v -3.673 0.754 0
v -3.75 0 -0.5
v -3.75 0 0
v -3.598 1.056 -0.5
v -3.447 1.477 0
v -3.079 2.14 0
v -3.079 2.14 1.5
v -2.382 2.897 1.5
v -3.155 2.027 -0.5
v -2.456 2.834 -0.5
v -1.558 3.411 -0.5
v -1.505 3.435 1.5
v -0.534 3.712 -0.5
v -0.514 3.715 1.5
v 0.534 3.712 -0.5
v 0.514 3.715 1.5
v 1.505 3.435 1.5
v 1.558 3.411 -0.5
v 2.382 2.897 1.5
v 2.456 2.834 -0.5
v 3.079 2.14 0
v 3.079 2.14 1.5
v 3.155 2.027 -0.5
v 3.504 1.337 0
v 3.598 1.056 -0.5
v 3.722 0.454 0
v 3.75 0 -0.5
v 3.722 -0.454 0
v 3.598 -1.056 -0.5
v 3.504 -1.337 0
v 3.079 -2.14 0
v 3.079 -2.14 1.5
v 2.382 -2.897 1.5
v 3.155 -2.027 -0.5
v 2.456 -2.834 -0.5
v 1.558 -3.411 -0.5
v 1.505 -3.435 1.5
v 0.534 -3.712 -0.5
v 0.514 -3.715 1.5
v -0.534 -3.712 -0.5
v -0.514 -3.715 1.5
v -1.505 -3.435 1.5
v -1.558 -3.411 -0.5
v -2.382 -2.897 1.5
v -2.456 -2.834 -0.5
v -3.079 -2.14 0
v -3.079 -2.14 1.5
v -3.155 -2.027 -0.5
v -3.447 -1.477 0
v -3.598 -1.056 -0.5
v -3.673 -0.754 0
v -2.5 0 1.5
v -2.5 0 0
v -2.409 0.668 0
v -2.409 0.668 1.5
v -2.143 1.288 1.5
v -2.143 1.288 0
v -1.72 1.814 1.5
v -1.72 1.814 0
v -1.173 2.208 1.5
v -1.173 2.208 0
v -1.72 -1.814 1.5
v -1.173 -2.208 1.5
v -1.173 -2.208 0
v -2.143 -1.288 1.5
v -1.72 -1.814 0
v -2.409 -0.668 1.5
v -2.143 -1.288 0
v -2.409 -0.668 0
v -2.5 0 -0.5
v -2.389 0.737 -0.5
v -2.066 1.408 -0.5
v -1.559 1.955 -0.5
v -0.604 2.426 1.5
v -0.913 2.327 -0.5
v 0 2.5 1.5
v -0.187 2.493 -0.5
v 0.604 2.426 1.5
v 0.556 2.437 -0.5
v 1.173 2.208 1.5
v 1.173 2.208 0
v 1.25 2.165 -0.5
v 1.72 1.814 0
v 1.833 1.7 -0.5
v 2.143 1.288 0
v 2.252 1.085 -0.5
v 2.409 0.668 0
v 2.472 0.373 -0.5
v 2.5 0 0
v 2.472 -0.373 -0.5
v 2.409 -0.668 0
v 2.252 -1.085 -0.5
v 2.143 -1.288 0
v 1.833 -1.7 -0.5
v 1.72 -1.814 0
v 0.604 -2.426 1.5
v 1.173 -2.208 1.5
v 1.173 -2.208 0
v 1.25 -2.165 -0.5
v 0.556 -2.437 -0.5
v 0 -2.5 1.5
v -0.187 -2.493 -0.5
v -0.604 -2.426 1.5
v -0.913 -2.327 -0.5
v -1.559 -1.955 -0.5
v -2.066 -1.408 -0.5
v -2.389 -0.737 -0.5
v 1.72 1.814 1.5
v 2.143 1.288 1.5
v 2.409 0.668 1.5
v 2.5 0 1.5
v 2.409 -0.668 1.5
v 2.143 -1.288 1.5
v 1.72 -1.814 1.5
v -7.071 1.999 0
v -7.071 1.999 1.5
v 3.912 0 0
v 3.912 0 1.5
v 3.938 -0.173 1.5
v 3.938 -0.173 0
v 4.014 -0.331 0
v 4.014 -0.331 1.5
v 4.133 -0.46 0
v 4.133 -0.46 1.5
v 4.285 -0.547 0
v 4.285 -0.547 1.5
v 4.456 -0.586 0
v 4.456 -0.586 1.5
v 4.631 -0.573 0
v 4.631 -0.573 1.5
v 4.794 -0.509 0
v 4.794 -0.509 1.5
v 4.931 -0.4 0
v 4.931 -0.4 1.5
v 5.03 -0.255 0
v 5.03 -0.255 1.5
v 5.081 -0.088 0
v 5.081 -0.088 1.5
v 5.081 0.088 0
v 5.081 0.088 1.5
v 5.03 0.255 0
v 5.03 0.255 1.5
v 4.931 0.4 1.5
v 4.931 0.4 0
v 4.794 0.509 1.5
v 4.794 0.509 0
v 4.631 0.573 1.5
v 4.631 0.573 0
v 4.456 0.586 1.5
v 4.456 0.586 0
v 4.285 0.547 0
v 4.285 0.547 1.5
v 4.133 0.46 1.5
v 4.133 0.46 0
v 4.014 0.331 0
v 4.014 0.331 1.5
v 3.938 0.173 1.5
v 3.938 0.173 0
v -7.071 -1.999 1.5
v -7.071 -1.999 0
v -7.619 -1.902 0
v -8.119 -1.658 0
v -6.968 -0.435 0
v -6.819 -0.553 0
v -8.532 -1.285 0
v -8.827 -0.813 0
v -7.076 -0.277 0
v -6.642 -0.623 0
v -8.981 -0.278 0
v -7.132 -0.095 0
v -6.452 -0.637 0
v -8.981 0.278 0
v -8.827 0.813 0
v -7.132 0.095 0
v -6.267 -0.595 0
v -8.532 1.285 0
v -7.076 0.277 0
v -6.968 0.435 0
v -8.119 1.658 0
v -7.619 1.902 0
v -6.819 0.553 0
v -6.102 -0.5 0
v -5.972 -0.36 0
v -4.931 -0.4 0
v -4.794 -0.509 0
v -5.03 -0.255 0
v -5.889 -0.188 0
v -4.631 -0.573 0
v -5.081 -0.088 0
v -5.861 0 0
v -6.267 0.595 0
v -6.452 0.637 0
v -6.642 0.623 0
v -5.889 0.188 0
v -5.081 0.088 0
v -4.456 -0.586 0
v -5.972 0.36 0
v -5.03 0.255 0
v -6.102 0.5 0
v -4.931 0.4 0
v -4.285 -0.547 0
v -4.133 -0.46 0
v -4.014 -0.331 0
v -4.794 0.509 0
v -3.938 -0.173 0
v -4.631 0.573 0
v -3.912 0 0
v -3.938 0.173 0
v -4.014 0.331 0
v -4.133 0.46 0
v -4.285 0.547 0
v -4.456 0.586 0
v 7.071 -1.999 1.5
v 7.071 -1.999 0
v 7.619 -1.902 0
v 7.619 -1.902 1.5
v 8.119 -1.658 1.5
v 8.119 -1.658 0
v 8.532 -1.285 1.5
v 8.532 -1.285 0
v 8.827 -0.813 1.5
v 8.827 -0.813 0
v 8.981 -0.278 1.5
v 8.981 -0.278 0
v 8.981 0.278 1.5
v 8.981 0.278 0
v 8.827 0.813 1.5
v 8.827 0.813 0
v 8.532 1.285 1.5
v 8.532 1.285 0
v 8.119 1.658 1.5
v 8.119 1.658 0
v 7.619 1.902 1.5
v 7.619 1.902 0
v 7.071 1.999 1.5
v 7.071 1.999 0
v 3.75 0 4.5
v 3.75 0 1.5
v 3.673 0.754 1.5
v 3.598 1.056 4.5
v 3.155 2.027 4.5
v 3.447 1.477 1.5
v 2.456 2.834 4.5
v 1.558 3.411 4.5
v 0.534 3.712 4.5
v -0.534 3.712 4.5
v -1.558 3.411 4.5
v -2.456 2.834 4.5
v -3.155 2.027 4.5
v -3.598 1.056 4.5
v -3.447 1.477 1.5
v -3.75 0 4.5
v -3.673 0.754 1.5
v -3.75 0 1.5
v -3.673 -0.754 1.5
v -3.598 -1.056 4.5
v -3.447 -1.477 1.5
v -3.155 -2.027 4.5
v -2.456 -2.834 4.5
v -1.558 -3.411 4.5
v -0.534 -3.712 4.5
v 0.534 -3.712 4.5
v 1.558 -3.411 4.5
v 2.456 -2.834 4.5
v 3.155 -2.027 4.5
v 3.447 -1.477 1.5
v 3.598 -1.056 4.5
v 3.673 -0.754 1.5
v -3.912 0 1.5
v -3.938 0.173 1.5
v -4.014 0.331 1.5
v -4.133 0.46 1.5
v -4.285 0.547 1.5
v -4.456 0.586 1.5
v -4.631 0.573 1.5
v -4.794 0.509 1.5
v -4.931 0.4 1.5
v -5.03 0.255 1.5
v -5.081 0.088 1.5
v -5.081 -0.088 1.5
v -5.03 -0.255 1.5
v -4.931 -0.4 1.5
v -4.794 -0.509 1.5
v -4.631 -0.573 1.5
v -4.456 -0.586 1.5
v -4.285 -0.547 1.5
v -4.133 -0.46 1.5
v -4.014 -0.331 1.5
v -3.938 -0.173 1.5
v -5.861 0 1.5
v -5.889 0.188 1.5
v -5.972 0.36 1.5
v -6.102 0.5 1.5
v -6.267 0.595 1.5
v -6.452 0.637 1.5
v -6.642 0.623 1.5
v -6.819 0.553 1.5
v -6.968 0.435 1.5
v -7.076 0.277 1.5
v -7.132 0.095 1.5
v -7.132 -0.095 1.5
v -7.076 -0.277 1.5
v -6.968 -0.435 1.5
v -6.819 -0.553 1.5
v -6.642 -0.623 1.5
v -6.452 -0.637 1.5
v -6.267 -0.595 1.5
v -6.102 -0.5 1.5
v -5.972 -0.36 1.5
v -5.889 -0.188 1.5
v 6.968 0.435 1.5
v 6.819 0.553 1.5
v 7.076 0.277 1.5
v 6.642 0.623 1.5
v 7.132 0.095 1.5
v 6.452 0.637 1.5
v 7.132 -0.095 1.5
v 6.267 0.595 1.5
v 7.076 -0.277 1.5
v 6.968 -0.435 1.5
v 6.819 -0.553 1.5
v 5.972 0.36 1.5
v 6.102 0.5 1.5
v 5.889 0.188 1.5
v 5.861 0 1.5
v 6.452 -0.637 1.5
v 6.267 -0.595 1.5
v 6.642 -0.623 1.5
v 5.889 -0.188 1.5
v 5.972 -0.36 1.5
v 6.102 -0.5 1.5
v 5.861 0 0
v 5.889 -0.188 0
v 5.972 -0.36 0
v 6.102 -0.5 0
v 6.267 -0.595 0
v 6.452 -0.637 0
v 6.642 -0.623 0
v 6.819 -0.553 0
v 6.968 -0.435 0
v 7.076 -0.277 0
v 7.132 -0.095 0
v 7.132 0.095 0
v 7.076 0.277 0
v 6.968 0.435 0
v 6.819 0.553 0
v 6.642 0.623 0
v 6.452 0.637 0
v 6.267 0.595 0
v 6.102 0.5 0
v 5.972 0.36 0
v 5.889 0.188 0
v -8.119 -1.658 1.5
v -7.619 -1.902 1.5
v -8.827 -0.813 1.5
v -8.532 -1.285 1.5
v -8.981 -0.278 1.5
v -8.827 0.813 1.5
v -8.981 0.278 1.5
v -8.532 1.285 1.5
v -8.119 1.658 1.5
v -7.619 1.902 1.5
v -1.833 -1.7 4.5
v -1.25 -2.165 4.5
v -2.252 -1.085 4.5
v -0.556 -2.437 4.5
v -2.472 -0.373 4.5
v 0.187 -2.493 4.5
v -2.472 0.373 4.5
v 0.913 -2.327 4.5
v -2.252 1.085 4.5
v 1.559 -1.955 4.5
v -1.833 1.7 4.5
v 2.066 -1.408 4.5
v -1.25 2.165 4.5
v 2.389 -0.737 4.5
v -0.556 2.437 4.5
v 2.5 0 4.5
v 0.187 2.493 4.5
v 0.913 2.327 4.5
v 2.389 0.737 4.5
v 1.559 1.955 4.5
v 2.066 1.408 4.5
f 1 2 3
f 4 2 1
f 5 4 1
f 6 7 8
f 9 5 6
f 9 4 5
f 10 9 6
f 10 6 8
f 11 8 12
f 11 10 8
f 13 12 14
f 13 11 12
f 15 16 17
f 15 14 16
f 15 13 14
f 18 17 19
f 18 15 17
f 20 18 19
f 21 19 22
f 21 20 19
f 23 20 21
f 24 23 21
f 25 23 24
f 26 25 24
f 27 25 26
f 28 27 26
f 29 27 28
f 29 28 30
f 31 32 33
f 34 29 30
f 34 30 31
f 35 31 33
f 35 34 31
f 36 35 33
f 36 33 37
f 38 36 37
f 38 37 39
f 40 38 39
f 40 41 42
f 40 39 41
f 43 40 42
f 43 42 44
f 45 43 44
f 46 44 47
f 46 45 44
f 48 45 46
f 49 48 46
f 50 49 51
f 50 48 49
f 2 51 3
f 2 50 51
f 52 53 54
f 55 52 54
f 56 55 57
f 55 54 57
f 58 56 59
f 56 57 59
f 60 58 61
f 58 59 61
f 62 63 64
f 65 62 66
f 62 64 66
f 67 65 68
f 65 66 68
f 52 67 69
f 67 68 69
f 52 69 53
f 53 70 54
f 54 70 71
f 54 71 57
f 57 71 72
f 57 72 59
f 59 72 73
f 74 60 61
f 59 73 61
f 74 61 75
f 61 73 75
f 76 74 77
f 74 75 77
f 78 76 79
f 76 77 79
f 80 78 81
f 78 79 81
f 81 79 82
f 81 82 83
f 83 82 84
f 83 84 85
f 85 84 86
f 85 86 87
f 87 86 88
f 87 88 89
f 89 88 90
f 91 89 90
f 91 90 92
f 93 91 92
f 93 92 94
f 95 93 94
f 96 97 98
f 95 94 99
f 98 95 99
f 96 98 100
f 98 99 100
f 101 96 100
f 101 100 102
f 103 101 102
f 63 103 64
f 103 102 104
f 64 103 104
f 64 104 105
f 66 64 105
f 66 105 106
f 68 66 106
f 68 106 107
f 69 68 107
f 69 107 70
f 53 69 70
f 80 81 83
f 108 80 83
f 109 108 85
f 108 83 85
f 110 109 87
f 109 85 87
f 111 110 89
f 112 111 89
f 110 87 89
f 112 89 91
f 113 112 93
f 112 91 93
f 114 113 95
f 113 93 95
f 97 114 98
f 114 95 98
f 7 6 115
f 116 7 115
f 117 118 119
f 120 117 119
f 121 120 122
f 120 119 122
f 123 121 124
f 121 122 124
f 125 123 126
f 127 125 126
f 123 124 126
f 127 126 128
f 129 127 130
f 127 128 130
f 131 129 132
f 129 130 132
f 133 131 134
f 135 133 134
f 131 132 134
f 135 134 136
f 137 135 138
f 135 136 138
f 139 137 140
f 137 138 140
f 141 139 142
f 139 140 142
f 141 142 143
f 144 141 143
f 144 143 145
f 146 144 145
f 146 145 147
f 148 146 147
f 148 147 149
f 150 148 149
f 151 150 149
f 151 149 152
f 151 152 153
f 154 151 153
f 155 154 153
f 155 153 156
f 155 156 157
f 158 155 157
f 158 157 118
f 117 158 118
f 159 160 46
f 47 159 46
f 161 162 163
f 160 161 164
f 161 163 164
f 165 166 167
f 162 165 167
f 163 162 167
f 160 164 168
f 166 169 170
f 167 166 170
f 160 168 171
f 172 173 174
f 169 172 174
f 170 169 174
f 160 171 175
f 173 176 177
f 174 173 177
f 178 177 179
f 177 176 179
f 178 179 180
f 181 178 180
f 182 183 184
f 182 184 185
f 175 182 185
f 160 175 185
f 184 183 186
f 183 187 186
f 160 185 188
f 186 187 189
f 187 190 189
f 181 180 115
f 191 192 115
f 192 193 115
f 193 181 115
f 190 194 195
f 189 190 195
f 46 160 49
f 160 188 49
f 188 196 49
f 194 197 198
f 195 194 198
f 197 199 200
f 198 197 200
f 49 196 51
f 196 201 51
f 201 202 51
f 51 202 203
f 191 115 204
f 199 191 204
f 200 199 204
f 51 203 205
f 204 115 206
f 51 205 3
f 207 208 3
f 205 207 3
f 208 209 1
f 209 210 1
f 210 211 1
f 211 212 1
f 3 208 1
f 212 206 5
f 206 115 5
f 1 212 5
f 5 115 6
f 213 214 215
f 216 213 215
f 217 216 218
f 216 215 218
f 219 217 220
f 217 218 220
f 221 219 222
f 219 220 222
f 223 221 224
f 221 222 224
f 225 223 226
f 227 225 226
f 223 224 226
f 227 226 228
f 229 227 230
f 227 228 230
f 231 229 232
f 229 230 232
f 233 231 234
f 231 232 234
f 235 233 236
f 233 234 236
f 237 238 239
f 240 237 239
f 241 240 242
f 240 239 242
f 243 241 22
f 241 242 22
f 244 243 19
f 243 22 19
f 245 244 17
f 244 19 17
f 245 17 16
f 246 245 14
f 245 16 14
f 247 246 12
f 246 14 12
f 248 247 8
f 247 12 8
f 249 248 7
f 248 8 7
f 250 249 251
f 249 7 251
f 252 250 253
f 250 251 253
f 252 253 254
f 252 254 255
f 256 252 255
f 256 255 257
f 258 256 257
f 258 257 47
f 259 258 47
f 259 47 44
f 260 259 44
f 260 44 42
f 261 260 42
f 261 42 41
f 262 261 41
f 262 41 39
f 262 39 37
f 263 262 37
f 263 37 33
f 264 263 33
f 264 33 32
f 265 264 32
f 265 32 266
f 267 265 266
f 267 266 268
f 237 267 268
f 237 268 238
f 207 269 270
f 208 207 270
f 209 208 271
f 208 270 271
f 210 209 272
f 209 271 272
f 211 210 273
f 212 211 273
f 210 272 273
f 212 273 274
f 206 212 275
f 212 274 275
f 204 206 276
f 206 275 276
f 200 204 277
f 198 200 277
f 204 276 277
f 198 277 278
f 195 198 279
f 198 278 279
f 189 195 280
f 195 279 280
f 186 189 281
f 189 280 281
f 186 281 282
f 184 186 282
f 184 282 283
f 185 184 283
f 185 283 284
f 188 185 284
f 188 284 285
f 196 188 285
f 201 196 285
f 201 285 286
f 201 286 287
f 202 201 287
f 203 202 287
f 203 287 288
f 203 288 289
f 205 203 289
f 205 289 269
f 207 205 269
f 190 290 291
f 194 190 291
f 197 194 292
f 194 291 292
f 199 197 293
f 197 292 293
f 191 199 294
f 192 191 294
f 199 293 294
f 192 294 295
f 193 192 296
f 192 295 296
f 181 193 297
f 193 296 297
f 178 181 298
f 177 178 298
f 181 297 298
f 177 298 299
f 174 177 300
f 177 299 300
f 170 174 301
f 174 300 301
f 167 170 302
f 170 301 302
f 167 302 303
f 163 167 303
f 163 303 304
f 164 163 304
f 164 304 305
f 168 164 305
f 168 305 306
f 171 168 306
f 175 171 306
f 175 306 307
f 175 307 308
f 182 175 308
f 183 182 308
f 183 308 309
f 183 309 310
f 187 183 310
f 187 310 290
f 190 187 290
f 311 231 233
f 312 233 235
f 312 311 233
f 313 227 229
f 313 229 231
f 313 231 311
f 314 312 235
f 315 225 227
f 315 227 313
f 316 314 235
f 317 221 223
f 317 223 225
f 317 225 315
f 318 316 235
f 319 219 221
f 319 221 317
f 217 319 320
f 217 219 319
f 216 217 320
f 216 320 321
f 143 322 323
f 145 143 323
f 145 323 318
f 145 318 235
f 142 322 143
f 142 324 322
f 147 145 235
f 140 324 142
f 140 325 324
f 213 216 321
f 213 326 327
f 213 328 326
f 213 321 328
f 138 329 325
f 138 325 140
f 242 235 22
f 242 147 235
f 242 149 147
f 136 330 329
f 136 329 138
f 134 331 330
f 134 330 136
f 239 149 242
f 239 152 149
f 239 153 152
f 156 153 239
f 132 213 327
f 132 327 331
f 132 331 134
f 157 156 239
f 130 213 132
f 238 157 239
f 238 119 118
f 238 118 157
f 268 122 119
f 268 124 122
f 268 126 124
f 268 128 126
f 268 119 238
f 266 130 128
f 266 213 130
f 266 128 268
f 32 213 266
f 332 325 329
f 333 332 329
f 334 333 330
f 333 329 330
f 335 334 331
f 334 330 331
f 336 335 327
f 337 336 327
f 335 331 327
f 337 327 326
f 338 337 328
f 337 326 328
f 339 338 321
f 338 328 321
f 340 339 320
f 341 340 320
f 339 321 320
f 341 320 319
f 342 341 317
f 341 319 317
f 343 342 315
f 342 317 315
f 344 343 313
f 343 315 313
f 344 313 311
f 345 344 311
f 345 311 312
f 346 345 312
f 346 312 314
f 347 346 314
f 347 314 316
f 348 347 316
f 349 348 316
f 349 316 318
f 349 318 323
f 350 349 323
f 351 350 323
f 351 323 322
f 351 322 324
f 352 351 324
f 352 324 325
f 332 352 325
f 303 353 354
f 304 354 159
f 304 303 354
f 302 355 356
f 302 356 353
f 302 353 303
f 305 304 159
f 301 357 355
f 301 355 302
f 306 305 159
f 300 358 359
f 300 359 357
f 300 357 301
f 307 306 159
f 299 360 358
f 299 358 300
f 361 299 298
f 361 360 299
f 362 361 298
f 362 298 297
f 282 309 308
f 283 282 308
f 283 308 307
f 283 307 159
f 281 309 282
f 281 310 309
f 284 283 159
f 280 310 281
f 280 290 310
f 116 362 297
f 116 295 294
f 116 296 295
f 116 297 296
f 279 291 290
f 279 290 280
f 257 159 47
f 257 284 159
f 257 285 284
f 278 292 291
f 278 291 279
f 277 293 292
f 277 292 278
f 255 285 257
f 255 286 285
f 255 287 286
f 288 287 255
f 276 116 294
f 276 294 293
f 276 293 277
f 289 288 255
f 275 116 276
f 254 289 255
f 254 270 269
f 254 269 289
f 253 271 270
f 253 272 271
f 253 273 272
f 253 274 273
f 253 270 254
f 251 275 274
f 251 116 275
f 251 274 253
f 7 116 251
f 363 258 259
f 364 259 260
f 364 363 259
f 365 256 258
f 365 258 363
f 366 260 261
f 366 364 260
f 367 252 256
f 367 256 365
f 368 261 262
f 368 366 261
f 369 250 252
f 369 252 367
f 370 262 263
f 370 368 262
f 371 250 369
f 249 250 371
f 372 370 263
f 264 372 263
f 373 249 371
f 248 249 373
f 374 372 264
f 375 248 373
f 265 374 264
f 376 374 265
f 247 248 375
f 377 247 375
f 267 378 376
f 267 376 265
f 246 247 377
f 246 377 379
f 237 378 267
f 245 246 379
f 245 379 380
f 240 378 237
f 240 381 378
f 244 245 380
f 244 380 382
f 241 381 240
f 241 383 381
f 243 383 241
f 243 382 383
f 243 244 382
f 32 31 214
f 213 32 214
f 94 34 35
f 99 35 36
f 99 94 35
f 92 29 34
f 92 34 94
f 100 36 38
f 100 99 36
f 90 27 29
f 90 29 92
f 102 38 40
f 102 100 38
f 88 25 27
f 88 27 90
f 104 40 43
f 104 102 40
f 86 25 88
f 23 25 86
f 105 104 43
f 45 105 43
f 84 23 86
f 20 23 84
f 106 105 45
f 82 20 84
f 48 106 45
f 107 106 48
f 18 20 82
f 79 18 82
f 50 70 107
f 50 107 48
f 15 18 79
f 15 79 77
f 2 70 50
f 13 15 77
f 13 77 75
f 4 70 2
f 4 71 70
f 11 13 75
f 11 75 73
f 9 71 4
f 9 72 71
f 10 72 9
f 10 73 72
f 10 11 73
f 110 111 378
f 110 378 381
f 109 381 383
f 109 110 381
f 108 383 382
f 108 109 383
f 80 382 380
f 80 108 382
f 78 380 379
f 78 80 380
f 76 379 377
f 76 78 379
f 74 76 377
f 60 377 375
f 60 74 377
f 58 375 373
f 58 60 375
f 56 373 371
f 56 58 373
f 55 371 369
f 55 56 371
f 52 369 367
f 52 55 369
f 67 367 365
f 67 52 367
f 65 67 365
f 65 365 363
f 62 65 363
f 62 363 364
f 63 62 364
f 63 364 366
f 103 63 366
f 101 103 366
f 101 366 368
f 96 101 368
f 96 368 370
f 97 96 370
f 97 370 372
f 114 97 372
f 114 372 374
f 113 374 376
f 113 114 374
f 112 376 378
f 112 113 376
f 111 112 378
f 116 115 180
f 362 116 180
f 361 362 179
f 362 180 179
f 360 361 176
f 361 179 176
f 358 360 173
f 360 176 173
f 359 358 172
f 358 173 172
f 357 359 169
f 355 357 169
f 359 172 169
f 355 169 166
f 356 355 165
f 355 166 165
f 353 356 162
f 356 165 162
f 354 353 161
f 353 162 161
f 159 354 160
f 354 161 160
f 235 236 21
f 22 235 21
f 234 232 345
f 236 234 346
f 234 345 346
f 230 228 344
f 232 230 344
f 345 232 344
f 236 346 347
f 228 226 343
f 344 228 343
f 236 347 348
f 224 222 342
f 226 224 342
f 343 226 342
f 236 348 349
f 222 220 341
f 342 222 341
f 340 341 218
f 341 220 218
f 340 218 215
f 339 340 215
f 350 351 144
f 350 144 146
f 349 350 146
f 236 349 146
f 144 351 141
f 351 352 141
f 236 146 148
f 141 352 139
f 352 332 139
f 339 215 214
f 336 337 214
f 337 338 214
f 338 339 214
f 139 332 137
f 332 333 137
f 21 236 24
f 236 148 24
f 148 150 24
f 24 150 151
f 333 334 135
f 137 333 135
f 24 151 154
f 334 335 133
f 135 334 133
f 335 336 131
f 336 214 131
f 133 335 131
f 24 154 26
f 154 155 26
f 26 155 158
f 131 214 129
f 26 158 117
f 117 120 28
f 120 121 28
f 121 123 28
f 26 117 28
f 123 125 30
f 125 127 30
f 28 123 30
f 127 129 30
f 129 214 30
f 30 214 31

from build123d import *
from build123d.topology import SkipClean

# Parameters (mm, degrees)
EXTRUDE_3_DEPTH              = 1.5
EXTRUDE_3_2_DEPTH            = 1.5
SKETCH_2_R                   = 3.75
SKETCH_2_R_2                 = 2.5
EXTRUDE_5_DEPTH              = 3
EXTRUDE_START                = 2
SKETCH_3_R                   = 3.75
SKETCH_3_R_2                 = 2.5
EXTRUDE_6_DEPTH              = 2
ESQUISSE1_R                  = 0.587851578
ESQUISSE1_R_2                = 0.638983792
ENL_V_MAT_EXTRU_1_DEPTH      = 10
R_P_TITION_CIRCULAIRE1_COUNT = 2


with BuildPart() as part:
    # Эскиз1 → Бобышка-Вытянуть3 (new body)
    with BuildSketch(Plane.XY):
        with BuildLine():
            ThreePointArc((-3.079299832, -2.140189839), (-3.57839869, -1.121411082), (-3.75, 0))
            ThreePointArc((-3.75, 0), (-3.57839869, 1.121411082), (-3.079299832, 2.140189839))
            Line((-3.079299832, 2.140189839), (-7.07082784, 1.998745461))
            ThreePointArc((-7.07082784, 1.998745461), (-9, 0), (-7.07082784, -1.998745461))
            Line((-7.07082784, -1.998745461), (-3.079299832, -2.140189839))
        make_face()
    extrude_3 = extrude(amount=EXTRUDE_3_DEPTH)



with BuildPart() as body_2:
    # Эскиз1 → Extrude 3 2 (new body)
    with BuildSketch(Plane.XY):
        with BuildLine():
            Line((3.079299832, 2.140189839), (1.172975936, 2.207742615))
            ThreePointArc((1.172975936, 2.207742615), (2.5, 0), (1.172975936, -2.207742615))
            Line((1.172975936, -2.207742615), (3.079299832, -2.140189839))
            ThreePointArc((3.079299832, -2.140189839), (3.75, 0), (3.079299832, 2.140189839))
        make_face()
    extrude_3_2 = extrude(amount=EXTRUDE_3_2_DEPTH)


with BuildPart() as body_3:
    # Эскиз2 → Бобышка-Вытянуть5 (new body)
    with BuildSketch(Plane.XY.offset(1.5)):
        Circle(SKETCH_2_R)
        Circle(SKETCH_2_R_2, mode=Mode.SUBTRACT)
    extrude(amount=EXTRUDE_5_DEPTH)


with BuildPart() as part_1:
    with SkipClean():  # the faces are left unmerged after this step: merging them gives an invalid solid
        add(part.part)

        add(body_2.part)  # Бобышка-Вытянуть6 merges body 2

        add(body_3.part)  # Бобышка-Вытянуть6 merges body 3
        # Эскиз3 → Бобышка-Вытянуть6 (add)
        with BuildSketch(Plane(origin=(0, 0, 1.5), x_dir=(-1, 0, 0), z_dir=(0, 0, -1)).offset(EXTRUDE_START)):
            Circle(SKETCH_3_R)
            Circle(SKETCH_3_R_2, mode=Mode.SUBTRACT)
        extrude(amount=-EXTRUDE_6_DEPTH)

    # Esquisse1 → Enlèv. mat.-Extru.1 (cut)
    with SkipClean():  # the faces are left unmerged after this step: merging them gives an invalid solid
        with BuildSketch(Plane.XY.offset(1.5)):
            with Locations((-4.5, 0)):
                Circle(ESQUISSE1_R)
            with Locations((-6.5, 0)):
                Circle(ESQUISSE1_R_2)
        enl_v_mat_extru_1 = extrude(amount=-ENL_V_MAT_EXTRU_1_DEPTH, mode=Mode.SUBTRACT)

    # Répétition circulaire1: Бобышка-Вытянуть3, Extrude 3 2, Enlèv. mat.-Extru.1 ×2 about axis
    with SkipClean():  # the faces are left unmerged after this step: merging them gives an invalid solid
        r_p_tition_circulaire1_axis = Axis((0, 0, 4.5), (0, 0, 1))
        add([extrude_3.rotate(r_p_tition_circulaire1_axis, i * 360 / R_P_TITION_CIRCULAIRE1_COUNT) for i in range(1, R_P_TITION_CIRCULAIRE1_COUNT)])
        add([extrude_3_2.rotate(r_p_tition_circulaire1_axis, i * 360 / R_P_TITION_CIRCULAIRE1_COUNT) for i in range(1, R_P_TITION_CIRCULAIRE1_COUNT)])
        add([enl_v_mat_extru_1.rotate(r_p_tition_circulaire1_axis, i * 360 / R_P_TITION_CIRCULAIRE1_COUNT) for i in range(1, R_P_TITION_CIRCULAIRE1_COUNT)], mode=Mode.SUBTRACT)
    add(part_1.part.scale(1), mode=Mode.REPLACE)  # the faces are merged on a copy


solid = part_1.part
